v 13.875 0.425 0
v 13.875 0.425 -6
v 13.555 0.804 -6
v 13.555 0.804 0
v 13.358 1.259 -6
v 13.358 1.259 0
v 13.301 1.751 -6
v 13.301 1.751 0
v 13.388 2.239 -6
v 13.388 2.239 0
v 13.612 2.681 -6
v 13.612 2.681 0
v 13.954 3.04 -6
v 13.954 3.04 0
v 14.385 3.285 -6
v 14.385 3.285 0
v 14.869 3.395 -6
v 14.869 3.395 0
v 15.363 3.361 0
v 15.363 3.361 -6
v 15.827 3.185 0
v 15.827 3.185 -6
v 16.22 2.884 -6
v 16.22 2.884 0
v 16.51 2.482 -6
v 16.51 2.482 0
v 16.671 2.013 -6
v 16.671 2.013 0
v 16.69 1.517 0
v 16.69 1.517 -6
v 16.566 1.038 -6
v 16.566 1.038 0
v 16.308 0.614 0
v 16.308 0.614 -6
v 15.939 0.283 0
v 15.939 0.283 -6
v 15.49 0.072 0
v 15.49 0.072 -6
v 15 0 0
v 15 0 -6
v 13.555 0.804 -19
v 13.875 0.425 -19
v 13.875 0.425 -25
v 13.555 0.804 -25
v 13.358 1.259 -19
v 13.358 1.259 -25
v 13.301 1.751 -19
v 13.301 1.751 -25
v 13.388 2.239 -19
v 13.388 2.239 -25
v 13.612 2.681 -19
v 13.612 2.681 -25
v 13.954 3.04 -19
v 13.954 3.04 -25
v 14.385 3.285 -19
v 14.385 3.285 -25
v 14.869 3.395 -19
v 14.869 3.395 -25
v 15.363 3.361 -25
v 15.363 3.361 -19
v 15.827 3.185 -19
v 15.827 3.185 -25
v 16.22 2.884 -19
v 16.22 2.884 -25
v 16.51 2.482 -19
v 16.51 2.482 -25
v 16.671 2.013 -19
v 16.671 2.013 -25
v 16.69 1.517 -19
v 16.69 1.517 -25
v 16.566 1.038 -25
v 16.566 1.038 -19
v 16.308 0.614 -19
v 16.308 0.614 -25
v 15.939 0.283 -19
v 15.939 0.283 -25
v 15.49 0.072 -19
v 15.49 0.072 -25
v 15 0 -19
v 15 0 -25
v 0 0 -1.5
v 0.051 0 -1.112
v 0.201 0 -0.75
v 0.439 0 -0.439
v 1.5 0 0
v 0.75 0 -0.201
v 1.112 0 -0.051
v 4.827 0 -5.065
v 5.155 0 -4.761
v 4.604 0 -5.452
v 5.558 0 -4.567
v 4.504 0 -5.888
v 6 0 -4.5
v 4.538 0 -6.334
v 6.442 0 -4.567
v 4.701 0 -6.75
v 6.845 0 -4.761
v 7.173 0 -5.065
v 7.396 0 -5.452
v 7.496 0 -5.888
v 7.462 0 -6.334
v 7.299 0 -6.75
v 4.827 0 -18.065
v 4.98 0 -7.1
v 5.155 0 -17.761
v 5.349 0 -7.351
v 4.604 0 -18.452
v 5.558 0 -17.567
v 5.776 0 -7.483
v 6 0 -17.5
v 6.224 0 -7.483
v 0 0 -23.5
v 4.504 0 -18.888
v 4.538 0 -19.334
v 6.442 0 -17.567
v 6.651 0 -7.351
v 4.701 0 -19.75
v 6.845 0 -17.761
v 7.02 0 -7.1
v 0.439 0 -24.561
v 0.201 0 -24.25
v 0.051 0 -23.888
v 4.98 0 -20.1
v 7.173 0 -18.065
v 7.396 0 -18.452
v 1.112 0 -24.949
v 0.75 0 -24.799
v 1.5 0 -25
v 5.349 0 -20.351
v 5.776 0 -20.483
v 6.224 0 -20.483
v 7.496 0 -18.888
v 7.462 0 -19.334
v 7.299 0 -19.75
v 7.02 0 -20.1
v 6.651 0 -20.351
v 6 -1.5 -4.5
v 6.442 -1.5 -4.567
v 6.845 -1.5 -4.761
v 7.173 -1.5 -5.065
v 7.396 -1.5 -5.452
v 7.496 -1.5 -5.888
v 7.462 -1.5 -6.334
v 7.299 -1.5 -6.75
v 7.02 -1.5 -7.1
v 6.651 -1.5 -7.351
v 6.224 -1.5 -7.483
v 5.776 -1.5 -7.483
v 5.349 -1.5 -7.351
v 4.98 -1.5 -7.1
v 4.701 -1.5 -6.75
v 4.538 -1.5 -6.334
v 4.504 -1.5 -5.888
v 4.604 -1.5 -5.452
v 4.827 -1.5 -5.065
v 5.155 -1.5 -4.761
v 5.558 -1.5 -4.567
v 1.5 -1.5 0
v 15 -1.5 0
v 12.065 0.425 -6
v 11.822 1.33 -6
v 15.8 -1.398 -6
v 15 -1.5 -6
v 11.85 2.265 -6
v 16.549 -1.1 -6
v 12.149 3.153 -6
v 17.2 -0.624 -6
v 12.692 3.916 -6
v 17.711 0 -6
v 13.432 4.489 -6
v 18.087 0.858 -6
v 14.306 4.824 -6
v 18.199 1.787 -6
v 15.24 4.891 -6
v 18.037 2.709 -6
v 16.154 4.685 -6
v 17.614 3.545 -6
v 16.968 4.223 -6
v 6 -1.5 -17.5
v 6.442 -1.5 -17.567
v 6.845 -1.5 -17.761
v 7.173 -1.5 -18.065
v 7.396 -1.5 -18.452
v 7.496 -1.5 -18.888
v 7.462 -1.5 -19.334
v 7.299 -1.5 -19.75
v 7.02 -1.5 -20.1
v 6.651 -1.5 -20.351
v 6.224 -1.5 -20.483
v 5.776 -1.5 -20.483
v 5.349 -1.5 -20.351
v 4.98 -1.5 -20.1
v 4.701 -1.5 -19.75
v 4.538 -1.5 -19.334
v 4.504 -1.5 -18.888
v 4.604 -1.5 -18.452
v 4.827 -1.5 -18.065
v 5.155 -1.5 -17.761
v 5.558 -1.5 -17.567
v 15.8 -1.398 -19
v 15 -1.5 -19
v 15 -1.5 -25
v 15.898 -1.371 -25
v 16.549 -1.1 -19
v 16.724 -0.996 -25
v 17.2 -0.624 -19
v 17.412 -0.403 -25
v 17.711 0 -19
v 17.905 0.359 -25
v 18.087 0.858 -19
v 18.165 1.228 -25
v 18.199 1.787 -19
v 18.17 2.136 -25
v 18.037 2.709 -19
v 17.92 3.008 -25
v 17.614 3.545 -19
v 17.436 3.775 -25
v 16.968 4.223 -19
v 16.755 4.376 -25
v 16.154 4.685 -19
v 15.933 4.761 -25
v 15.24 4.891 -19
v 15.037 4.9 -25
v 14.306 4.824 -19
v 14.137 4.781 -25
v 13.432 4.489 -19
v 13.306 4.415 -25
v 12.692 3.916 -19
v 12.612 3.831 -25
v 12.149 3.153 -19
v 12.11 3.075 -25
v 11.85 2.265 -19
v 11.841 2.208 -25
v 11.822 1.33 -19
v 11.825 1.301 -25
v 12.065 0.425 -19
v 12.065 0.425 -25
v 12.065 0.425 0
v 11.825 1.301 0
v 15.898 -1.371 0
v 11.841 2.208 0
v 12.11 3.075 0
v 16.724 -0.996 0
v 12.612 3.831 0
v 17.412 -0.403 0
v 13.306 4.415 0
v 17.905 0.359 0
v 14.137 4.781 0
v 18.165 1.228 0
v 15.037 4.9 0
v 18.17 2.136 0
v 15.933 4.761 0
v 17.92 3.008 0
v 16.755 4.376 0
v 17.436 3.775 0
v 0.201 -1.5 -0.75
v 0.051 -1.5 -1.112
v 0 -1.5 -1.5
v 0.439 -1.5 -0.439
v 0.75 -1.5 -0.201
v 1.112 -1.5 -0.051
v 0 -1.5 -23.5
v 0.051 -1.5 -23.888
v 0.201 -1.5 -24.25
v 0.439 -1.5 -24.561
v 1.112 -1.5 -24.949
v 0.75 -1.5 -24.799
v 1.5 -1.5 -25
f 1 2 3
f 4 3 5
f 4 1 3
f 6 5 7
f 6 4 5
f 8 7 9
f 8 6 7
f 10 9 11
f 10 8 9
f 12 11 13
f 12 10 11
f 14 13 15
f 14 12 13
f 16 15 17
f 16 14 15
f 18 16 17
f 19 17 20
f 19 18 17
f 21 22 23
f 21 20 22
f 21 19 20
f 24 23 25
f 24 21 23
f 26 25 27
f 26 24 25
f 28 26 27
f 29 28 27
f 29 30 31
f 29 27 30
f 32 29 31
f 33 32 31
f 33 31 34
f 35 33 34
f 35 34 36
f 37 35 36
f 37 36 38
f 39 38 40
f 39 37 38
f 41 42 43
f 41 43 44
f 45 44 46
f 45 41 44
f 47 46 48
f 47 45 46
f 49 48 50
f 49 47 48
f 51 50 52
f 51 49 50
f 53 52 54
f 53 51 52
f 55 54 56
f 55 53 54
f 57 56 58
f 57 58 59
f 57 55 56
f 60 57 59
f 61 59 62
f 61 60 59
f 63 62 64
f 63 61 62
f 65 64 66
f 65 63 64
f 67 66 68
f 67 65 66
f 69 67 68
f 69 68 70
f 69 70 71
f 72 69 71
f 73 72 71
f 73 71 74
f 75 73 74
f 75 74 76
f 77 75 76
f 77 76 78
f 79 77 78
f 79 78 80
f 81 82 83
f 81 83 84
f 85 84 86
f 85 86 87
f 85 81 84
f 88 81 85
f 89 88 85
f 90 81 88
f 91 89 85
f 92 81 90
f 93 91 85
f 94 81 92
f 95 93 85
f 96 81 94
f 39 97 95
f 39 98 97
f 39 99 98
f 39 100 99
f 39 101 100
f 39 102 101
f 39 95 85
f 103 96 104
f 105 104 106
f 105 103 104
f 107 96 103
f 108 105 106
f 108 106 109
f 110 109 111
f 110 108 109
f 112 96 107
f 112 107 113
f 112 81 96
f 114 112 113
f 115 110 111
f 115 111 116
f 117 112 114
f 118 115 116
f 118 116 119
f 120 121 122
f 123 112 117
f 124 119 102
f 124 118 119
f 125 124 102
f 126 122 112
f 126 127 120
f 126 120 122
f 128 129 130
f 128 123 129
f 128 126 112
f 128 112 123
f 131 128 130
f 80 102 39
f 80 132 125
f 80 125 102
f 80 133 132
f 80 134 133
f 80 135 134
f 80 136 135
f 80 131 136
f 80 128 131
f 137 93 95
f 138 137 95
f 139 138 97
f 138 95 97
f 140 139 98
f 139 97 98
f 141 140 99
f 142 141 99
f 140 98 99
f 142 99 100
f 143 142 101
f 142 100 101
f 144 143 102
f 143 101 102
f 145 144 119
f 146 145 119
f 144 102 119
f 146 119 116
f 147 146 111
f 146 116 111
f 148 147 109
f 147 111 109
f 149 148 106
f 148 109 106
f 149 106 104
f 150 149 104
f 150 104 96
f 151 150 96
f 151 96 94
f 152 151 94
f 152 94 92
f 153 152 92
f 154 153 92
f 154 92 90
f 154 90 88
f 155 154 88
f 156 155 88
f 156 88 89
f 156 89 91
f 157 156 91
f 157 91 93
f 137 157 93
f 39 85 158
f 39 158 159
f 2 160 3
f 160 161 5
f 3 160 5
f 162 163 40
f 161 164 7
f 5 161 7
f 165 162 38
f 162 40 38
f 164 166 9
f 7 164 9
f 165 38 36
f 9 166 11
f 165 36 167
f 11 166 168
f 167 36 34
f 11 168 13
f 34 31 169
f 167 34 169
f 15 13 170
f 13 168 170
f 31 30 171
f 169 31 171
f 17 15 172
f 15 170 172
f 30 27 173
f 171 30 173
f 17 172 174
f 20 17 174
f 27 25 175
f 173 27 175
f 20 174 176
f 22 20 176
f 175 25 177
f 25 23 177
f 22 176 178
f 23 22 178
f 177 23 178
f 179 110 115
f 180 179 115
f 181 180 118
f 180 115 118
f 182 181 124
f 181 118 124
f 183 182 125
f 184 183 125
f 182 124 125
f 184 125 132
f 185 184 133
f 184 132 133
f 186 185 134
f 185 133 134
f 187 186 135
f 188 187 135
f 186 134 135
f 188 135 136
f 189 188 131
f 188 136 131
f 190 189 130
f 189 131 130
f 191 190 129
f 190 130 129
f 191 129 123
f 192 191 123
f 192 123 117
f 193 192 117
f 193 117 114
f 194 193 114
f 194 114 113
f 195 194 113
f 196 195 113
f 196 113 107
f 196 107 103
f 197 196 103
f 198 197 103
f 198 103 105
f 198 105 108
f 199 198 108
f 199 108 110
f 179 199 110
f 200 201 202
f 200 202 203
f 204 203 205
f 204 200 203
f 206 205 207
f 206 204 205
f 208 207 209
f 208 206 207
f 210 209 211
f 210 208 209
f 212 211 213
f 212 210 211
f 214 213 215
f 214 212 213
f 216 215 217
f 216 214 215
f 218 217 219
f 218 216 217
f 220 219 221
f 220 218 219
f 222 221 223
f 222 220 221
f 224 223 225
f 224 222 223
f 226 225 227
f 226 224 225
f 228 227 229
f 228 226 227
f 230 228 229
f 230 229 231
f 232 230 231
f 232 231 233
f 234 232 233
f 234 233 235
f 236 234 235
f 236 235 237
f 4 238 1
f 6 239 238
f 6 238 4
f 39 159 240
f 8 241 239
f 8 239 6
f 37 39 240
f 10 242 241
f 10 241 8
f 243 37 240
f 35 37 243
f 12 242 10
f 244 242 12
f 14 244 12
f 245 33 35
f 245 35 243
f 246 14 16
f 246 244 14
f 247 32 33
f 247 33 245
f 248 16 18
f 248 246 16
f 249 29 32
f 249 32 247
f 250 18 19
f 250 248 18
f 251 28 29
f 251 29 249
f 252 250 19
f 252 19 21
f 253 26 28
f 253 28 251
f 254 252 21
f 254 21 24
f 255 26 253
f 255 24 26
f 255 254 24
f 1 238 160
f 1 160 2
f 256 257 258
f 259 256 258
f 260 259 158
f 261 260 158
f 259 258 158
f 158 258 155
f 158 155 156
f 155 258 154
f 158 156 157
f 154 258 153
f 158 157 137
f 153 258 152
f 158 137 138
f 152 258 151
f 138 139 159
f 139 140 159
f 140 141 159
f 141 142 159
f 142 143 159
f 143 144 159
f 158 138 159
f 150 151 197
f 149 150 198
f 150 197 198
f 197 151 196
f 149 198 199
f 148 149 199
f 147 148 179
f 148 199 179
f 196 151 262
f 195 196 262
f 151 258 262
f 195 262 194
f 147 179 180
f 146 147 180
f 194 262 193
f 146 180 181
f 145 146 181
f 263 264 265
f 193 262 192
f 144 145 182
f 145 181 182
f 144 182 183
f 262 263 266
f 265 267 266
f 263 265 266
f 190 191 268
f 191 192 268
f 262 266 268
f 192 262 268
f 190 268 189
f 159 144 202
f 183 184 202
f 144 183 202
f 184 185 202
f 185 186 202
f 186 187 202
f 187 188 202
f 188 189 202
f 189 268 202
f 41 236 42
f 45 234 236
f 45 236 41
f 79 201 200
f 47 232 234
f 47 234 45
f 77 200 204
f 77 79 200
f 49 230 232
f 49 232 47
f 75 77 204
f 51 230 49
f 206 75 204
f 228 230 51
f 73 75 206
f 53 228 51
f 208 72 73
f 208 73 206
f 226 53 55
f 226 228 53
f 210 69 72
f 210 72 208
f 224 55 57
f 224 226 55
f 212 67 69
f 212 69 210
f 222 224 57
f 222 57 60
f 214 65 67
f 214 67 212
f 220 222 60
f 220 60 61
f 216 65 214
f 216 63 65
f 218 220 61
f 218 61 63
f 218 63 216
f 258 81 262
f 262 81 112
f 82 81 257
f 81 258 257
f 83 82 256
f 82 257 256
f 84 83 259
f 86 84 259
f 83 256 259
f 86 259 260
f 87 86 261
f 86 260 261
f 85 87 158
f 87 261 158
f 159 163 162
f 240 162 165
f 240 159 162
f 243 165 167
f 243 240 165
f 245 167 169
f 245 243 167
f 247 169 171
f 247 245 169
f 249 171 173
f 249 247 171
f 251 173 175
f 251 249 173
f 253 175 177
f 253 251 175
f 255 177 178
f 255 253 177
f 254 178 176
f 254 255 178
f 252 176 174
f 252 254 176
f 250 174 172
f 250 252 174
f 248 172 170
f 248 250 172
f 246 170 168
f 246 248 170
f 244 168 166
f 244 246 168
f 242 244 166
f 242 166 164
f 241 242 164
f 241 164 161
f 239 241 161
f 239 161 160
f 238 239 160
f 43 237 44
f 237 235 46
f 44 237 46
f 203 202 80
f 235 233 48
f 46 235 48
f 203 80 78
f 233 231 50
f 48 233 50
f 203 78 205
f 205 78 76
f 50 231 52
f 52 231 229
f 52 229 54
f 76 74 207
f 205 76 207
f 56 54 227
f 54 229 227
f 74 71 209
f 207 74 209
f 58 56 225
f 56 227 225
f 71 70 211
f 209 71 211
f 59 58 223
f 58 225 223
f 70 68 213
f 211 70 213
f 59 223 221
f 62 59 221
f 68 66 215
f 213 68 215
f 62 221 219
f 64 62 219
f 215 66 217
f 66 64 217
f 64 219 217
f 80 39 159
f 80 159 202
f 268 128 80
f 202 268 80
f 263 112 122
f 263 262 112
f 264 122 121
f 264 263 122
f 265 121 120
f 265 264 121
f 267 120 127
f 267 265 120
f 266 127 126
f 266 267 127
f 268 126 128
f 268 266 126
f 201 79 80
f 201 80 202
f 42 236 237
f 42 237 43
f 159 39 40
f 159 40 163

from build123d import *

# Parameters (mm, degrees)
SKETCH_1_W             = 15
SKETCH_1_H             = 25
SM_BASE_FLANGE_1_DEPTH = 1.5
SKETCH_6_R             = 1.5
CUT_EXTRUDE_1_DEPTH    = 10
SM_BASE_FLANGE_2_DEPTH = 25
SKETCH_10_W            = 13
SKETCH_10_H            = 7.865530851
CUT_EXTRUDE_3_DEPTH    = 32.308944409
SKETCH_11_W            = 2.711088342
SKETCH_11_H            = 13
CUT_EXTRUDE_5_DEPTH    = 10
FILLET_1_R             = 1.5


# Sheet-metal steps are written as plain solids
with BuildPart() as part:
    # Sketch 1 → 基体-法兰1 (new body)
    with BuildSketch(Plane(origin=(0, 0, 0), x_dir=(1, 0, 0), z_dir=(0, 1, 0))):
        with Locations((7.5, 12.5)):
            Rectangle(SKETCH_1_W, SKETCH_1_H)
    extrude(amount=-SM_BASE_FLANGE_1_DEPTH)

    # Sketch 6 → 切除-拉伸1 (cut)
    with BuildSketch(Plane(origin=(0, 0, 0), x_dir=(1, 0, 0), z_dir=(0, 1, 0))):
        with Locations(Location((6, 19, 0), (0, 0, 270))):
            Circle(SKETCH_6_R)
        with Locations(Location((6, 6, 0), (0, 0, 270))):
            Circle(SKETCH_6_R)
    extrude(amount=-CUT_EXTRUDE_1_DEPTH, mode=Mode.SUBTRACT)

    # 圆角1
    fillet_1_edges = [part.edges().sort_by_distance(p)[0] for p in [
        (0, -0.75, -25),
        (0, -0.75, 0),
    ]]
    fillet(fillet_1_edges, radius=FILLET_1_R)


with BuildPart() as body_2:
    # Sketch 7 → 基体-法兰2 (new body)
    with BuildSketch(Plane.XY):
        with BuildLine():
            Line((15, 0), (15, -1.5))
            ThreePointArc((15, -1.5), (16.755157486, 4.375709662), (12.064817597, 0.425361126))
            Line((12.064817597, 0.425361126), (13.875146347, 0.425361126))
            ThreePointArc((13.875146347, 0.425361126), (15.601296065, 3.290107871), (15, 0))
        make_face()
    extrude(amount=-SM_BASE_FLANGE_2_DEPTH)

    # 草图10 → 切除-拉伸3 (cut, through all)
    with BuildSketch(Plane.ZY):
        with Locations((-12.5, 3.932765426)):
            Rectangle(SKETCH_10_W, SKETCH_10_H)
    extrude(amount=-CUT_EXTRUDE_3_DEPTH, mode=Mode.SUBTRACT)

    # 草图11 → 切除-拉伸5 (cut)
    with BuildSketch(Plane(origin=(0, 0, 0), x_dir=(1, 0, 0), z_dir=(0, 1, 0))):
        with Locations((16.355544171, 12.5)):
            Rectangle(SKETCH_11_W, SKETCH_11_H)
    extrude(amount=-CUT_EXTRUDE_5_DEPTH, mode=Mode.SUBTRACT)


with BuildPart() as cut_extrude_5_piece_1:
    # of the separate pieces the step leaves, piece 1, a body of its own (cut_extrude_5_pieces)
    add(body_2.part.solids().sort_by_distance((12.064817597, 0.425361126, 0))[0])


with BuildPart() as cut_extrude_5_piece_2:
    # of the separate pieces the step leaves, piece 2, a body of its own (cut_extrude_5_pieces)
    add(body_2.part.solids().sort_by_distance((15, -1.5, -19))[0])


solid = Compound([part.part, cut_extrude_5_piece_1.part, cut_extrude_5_piece_2.part])
